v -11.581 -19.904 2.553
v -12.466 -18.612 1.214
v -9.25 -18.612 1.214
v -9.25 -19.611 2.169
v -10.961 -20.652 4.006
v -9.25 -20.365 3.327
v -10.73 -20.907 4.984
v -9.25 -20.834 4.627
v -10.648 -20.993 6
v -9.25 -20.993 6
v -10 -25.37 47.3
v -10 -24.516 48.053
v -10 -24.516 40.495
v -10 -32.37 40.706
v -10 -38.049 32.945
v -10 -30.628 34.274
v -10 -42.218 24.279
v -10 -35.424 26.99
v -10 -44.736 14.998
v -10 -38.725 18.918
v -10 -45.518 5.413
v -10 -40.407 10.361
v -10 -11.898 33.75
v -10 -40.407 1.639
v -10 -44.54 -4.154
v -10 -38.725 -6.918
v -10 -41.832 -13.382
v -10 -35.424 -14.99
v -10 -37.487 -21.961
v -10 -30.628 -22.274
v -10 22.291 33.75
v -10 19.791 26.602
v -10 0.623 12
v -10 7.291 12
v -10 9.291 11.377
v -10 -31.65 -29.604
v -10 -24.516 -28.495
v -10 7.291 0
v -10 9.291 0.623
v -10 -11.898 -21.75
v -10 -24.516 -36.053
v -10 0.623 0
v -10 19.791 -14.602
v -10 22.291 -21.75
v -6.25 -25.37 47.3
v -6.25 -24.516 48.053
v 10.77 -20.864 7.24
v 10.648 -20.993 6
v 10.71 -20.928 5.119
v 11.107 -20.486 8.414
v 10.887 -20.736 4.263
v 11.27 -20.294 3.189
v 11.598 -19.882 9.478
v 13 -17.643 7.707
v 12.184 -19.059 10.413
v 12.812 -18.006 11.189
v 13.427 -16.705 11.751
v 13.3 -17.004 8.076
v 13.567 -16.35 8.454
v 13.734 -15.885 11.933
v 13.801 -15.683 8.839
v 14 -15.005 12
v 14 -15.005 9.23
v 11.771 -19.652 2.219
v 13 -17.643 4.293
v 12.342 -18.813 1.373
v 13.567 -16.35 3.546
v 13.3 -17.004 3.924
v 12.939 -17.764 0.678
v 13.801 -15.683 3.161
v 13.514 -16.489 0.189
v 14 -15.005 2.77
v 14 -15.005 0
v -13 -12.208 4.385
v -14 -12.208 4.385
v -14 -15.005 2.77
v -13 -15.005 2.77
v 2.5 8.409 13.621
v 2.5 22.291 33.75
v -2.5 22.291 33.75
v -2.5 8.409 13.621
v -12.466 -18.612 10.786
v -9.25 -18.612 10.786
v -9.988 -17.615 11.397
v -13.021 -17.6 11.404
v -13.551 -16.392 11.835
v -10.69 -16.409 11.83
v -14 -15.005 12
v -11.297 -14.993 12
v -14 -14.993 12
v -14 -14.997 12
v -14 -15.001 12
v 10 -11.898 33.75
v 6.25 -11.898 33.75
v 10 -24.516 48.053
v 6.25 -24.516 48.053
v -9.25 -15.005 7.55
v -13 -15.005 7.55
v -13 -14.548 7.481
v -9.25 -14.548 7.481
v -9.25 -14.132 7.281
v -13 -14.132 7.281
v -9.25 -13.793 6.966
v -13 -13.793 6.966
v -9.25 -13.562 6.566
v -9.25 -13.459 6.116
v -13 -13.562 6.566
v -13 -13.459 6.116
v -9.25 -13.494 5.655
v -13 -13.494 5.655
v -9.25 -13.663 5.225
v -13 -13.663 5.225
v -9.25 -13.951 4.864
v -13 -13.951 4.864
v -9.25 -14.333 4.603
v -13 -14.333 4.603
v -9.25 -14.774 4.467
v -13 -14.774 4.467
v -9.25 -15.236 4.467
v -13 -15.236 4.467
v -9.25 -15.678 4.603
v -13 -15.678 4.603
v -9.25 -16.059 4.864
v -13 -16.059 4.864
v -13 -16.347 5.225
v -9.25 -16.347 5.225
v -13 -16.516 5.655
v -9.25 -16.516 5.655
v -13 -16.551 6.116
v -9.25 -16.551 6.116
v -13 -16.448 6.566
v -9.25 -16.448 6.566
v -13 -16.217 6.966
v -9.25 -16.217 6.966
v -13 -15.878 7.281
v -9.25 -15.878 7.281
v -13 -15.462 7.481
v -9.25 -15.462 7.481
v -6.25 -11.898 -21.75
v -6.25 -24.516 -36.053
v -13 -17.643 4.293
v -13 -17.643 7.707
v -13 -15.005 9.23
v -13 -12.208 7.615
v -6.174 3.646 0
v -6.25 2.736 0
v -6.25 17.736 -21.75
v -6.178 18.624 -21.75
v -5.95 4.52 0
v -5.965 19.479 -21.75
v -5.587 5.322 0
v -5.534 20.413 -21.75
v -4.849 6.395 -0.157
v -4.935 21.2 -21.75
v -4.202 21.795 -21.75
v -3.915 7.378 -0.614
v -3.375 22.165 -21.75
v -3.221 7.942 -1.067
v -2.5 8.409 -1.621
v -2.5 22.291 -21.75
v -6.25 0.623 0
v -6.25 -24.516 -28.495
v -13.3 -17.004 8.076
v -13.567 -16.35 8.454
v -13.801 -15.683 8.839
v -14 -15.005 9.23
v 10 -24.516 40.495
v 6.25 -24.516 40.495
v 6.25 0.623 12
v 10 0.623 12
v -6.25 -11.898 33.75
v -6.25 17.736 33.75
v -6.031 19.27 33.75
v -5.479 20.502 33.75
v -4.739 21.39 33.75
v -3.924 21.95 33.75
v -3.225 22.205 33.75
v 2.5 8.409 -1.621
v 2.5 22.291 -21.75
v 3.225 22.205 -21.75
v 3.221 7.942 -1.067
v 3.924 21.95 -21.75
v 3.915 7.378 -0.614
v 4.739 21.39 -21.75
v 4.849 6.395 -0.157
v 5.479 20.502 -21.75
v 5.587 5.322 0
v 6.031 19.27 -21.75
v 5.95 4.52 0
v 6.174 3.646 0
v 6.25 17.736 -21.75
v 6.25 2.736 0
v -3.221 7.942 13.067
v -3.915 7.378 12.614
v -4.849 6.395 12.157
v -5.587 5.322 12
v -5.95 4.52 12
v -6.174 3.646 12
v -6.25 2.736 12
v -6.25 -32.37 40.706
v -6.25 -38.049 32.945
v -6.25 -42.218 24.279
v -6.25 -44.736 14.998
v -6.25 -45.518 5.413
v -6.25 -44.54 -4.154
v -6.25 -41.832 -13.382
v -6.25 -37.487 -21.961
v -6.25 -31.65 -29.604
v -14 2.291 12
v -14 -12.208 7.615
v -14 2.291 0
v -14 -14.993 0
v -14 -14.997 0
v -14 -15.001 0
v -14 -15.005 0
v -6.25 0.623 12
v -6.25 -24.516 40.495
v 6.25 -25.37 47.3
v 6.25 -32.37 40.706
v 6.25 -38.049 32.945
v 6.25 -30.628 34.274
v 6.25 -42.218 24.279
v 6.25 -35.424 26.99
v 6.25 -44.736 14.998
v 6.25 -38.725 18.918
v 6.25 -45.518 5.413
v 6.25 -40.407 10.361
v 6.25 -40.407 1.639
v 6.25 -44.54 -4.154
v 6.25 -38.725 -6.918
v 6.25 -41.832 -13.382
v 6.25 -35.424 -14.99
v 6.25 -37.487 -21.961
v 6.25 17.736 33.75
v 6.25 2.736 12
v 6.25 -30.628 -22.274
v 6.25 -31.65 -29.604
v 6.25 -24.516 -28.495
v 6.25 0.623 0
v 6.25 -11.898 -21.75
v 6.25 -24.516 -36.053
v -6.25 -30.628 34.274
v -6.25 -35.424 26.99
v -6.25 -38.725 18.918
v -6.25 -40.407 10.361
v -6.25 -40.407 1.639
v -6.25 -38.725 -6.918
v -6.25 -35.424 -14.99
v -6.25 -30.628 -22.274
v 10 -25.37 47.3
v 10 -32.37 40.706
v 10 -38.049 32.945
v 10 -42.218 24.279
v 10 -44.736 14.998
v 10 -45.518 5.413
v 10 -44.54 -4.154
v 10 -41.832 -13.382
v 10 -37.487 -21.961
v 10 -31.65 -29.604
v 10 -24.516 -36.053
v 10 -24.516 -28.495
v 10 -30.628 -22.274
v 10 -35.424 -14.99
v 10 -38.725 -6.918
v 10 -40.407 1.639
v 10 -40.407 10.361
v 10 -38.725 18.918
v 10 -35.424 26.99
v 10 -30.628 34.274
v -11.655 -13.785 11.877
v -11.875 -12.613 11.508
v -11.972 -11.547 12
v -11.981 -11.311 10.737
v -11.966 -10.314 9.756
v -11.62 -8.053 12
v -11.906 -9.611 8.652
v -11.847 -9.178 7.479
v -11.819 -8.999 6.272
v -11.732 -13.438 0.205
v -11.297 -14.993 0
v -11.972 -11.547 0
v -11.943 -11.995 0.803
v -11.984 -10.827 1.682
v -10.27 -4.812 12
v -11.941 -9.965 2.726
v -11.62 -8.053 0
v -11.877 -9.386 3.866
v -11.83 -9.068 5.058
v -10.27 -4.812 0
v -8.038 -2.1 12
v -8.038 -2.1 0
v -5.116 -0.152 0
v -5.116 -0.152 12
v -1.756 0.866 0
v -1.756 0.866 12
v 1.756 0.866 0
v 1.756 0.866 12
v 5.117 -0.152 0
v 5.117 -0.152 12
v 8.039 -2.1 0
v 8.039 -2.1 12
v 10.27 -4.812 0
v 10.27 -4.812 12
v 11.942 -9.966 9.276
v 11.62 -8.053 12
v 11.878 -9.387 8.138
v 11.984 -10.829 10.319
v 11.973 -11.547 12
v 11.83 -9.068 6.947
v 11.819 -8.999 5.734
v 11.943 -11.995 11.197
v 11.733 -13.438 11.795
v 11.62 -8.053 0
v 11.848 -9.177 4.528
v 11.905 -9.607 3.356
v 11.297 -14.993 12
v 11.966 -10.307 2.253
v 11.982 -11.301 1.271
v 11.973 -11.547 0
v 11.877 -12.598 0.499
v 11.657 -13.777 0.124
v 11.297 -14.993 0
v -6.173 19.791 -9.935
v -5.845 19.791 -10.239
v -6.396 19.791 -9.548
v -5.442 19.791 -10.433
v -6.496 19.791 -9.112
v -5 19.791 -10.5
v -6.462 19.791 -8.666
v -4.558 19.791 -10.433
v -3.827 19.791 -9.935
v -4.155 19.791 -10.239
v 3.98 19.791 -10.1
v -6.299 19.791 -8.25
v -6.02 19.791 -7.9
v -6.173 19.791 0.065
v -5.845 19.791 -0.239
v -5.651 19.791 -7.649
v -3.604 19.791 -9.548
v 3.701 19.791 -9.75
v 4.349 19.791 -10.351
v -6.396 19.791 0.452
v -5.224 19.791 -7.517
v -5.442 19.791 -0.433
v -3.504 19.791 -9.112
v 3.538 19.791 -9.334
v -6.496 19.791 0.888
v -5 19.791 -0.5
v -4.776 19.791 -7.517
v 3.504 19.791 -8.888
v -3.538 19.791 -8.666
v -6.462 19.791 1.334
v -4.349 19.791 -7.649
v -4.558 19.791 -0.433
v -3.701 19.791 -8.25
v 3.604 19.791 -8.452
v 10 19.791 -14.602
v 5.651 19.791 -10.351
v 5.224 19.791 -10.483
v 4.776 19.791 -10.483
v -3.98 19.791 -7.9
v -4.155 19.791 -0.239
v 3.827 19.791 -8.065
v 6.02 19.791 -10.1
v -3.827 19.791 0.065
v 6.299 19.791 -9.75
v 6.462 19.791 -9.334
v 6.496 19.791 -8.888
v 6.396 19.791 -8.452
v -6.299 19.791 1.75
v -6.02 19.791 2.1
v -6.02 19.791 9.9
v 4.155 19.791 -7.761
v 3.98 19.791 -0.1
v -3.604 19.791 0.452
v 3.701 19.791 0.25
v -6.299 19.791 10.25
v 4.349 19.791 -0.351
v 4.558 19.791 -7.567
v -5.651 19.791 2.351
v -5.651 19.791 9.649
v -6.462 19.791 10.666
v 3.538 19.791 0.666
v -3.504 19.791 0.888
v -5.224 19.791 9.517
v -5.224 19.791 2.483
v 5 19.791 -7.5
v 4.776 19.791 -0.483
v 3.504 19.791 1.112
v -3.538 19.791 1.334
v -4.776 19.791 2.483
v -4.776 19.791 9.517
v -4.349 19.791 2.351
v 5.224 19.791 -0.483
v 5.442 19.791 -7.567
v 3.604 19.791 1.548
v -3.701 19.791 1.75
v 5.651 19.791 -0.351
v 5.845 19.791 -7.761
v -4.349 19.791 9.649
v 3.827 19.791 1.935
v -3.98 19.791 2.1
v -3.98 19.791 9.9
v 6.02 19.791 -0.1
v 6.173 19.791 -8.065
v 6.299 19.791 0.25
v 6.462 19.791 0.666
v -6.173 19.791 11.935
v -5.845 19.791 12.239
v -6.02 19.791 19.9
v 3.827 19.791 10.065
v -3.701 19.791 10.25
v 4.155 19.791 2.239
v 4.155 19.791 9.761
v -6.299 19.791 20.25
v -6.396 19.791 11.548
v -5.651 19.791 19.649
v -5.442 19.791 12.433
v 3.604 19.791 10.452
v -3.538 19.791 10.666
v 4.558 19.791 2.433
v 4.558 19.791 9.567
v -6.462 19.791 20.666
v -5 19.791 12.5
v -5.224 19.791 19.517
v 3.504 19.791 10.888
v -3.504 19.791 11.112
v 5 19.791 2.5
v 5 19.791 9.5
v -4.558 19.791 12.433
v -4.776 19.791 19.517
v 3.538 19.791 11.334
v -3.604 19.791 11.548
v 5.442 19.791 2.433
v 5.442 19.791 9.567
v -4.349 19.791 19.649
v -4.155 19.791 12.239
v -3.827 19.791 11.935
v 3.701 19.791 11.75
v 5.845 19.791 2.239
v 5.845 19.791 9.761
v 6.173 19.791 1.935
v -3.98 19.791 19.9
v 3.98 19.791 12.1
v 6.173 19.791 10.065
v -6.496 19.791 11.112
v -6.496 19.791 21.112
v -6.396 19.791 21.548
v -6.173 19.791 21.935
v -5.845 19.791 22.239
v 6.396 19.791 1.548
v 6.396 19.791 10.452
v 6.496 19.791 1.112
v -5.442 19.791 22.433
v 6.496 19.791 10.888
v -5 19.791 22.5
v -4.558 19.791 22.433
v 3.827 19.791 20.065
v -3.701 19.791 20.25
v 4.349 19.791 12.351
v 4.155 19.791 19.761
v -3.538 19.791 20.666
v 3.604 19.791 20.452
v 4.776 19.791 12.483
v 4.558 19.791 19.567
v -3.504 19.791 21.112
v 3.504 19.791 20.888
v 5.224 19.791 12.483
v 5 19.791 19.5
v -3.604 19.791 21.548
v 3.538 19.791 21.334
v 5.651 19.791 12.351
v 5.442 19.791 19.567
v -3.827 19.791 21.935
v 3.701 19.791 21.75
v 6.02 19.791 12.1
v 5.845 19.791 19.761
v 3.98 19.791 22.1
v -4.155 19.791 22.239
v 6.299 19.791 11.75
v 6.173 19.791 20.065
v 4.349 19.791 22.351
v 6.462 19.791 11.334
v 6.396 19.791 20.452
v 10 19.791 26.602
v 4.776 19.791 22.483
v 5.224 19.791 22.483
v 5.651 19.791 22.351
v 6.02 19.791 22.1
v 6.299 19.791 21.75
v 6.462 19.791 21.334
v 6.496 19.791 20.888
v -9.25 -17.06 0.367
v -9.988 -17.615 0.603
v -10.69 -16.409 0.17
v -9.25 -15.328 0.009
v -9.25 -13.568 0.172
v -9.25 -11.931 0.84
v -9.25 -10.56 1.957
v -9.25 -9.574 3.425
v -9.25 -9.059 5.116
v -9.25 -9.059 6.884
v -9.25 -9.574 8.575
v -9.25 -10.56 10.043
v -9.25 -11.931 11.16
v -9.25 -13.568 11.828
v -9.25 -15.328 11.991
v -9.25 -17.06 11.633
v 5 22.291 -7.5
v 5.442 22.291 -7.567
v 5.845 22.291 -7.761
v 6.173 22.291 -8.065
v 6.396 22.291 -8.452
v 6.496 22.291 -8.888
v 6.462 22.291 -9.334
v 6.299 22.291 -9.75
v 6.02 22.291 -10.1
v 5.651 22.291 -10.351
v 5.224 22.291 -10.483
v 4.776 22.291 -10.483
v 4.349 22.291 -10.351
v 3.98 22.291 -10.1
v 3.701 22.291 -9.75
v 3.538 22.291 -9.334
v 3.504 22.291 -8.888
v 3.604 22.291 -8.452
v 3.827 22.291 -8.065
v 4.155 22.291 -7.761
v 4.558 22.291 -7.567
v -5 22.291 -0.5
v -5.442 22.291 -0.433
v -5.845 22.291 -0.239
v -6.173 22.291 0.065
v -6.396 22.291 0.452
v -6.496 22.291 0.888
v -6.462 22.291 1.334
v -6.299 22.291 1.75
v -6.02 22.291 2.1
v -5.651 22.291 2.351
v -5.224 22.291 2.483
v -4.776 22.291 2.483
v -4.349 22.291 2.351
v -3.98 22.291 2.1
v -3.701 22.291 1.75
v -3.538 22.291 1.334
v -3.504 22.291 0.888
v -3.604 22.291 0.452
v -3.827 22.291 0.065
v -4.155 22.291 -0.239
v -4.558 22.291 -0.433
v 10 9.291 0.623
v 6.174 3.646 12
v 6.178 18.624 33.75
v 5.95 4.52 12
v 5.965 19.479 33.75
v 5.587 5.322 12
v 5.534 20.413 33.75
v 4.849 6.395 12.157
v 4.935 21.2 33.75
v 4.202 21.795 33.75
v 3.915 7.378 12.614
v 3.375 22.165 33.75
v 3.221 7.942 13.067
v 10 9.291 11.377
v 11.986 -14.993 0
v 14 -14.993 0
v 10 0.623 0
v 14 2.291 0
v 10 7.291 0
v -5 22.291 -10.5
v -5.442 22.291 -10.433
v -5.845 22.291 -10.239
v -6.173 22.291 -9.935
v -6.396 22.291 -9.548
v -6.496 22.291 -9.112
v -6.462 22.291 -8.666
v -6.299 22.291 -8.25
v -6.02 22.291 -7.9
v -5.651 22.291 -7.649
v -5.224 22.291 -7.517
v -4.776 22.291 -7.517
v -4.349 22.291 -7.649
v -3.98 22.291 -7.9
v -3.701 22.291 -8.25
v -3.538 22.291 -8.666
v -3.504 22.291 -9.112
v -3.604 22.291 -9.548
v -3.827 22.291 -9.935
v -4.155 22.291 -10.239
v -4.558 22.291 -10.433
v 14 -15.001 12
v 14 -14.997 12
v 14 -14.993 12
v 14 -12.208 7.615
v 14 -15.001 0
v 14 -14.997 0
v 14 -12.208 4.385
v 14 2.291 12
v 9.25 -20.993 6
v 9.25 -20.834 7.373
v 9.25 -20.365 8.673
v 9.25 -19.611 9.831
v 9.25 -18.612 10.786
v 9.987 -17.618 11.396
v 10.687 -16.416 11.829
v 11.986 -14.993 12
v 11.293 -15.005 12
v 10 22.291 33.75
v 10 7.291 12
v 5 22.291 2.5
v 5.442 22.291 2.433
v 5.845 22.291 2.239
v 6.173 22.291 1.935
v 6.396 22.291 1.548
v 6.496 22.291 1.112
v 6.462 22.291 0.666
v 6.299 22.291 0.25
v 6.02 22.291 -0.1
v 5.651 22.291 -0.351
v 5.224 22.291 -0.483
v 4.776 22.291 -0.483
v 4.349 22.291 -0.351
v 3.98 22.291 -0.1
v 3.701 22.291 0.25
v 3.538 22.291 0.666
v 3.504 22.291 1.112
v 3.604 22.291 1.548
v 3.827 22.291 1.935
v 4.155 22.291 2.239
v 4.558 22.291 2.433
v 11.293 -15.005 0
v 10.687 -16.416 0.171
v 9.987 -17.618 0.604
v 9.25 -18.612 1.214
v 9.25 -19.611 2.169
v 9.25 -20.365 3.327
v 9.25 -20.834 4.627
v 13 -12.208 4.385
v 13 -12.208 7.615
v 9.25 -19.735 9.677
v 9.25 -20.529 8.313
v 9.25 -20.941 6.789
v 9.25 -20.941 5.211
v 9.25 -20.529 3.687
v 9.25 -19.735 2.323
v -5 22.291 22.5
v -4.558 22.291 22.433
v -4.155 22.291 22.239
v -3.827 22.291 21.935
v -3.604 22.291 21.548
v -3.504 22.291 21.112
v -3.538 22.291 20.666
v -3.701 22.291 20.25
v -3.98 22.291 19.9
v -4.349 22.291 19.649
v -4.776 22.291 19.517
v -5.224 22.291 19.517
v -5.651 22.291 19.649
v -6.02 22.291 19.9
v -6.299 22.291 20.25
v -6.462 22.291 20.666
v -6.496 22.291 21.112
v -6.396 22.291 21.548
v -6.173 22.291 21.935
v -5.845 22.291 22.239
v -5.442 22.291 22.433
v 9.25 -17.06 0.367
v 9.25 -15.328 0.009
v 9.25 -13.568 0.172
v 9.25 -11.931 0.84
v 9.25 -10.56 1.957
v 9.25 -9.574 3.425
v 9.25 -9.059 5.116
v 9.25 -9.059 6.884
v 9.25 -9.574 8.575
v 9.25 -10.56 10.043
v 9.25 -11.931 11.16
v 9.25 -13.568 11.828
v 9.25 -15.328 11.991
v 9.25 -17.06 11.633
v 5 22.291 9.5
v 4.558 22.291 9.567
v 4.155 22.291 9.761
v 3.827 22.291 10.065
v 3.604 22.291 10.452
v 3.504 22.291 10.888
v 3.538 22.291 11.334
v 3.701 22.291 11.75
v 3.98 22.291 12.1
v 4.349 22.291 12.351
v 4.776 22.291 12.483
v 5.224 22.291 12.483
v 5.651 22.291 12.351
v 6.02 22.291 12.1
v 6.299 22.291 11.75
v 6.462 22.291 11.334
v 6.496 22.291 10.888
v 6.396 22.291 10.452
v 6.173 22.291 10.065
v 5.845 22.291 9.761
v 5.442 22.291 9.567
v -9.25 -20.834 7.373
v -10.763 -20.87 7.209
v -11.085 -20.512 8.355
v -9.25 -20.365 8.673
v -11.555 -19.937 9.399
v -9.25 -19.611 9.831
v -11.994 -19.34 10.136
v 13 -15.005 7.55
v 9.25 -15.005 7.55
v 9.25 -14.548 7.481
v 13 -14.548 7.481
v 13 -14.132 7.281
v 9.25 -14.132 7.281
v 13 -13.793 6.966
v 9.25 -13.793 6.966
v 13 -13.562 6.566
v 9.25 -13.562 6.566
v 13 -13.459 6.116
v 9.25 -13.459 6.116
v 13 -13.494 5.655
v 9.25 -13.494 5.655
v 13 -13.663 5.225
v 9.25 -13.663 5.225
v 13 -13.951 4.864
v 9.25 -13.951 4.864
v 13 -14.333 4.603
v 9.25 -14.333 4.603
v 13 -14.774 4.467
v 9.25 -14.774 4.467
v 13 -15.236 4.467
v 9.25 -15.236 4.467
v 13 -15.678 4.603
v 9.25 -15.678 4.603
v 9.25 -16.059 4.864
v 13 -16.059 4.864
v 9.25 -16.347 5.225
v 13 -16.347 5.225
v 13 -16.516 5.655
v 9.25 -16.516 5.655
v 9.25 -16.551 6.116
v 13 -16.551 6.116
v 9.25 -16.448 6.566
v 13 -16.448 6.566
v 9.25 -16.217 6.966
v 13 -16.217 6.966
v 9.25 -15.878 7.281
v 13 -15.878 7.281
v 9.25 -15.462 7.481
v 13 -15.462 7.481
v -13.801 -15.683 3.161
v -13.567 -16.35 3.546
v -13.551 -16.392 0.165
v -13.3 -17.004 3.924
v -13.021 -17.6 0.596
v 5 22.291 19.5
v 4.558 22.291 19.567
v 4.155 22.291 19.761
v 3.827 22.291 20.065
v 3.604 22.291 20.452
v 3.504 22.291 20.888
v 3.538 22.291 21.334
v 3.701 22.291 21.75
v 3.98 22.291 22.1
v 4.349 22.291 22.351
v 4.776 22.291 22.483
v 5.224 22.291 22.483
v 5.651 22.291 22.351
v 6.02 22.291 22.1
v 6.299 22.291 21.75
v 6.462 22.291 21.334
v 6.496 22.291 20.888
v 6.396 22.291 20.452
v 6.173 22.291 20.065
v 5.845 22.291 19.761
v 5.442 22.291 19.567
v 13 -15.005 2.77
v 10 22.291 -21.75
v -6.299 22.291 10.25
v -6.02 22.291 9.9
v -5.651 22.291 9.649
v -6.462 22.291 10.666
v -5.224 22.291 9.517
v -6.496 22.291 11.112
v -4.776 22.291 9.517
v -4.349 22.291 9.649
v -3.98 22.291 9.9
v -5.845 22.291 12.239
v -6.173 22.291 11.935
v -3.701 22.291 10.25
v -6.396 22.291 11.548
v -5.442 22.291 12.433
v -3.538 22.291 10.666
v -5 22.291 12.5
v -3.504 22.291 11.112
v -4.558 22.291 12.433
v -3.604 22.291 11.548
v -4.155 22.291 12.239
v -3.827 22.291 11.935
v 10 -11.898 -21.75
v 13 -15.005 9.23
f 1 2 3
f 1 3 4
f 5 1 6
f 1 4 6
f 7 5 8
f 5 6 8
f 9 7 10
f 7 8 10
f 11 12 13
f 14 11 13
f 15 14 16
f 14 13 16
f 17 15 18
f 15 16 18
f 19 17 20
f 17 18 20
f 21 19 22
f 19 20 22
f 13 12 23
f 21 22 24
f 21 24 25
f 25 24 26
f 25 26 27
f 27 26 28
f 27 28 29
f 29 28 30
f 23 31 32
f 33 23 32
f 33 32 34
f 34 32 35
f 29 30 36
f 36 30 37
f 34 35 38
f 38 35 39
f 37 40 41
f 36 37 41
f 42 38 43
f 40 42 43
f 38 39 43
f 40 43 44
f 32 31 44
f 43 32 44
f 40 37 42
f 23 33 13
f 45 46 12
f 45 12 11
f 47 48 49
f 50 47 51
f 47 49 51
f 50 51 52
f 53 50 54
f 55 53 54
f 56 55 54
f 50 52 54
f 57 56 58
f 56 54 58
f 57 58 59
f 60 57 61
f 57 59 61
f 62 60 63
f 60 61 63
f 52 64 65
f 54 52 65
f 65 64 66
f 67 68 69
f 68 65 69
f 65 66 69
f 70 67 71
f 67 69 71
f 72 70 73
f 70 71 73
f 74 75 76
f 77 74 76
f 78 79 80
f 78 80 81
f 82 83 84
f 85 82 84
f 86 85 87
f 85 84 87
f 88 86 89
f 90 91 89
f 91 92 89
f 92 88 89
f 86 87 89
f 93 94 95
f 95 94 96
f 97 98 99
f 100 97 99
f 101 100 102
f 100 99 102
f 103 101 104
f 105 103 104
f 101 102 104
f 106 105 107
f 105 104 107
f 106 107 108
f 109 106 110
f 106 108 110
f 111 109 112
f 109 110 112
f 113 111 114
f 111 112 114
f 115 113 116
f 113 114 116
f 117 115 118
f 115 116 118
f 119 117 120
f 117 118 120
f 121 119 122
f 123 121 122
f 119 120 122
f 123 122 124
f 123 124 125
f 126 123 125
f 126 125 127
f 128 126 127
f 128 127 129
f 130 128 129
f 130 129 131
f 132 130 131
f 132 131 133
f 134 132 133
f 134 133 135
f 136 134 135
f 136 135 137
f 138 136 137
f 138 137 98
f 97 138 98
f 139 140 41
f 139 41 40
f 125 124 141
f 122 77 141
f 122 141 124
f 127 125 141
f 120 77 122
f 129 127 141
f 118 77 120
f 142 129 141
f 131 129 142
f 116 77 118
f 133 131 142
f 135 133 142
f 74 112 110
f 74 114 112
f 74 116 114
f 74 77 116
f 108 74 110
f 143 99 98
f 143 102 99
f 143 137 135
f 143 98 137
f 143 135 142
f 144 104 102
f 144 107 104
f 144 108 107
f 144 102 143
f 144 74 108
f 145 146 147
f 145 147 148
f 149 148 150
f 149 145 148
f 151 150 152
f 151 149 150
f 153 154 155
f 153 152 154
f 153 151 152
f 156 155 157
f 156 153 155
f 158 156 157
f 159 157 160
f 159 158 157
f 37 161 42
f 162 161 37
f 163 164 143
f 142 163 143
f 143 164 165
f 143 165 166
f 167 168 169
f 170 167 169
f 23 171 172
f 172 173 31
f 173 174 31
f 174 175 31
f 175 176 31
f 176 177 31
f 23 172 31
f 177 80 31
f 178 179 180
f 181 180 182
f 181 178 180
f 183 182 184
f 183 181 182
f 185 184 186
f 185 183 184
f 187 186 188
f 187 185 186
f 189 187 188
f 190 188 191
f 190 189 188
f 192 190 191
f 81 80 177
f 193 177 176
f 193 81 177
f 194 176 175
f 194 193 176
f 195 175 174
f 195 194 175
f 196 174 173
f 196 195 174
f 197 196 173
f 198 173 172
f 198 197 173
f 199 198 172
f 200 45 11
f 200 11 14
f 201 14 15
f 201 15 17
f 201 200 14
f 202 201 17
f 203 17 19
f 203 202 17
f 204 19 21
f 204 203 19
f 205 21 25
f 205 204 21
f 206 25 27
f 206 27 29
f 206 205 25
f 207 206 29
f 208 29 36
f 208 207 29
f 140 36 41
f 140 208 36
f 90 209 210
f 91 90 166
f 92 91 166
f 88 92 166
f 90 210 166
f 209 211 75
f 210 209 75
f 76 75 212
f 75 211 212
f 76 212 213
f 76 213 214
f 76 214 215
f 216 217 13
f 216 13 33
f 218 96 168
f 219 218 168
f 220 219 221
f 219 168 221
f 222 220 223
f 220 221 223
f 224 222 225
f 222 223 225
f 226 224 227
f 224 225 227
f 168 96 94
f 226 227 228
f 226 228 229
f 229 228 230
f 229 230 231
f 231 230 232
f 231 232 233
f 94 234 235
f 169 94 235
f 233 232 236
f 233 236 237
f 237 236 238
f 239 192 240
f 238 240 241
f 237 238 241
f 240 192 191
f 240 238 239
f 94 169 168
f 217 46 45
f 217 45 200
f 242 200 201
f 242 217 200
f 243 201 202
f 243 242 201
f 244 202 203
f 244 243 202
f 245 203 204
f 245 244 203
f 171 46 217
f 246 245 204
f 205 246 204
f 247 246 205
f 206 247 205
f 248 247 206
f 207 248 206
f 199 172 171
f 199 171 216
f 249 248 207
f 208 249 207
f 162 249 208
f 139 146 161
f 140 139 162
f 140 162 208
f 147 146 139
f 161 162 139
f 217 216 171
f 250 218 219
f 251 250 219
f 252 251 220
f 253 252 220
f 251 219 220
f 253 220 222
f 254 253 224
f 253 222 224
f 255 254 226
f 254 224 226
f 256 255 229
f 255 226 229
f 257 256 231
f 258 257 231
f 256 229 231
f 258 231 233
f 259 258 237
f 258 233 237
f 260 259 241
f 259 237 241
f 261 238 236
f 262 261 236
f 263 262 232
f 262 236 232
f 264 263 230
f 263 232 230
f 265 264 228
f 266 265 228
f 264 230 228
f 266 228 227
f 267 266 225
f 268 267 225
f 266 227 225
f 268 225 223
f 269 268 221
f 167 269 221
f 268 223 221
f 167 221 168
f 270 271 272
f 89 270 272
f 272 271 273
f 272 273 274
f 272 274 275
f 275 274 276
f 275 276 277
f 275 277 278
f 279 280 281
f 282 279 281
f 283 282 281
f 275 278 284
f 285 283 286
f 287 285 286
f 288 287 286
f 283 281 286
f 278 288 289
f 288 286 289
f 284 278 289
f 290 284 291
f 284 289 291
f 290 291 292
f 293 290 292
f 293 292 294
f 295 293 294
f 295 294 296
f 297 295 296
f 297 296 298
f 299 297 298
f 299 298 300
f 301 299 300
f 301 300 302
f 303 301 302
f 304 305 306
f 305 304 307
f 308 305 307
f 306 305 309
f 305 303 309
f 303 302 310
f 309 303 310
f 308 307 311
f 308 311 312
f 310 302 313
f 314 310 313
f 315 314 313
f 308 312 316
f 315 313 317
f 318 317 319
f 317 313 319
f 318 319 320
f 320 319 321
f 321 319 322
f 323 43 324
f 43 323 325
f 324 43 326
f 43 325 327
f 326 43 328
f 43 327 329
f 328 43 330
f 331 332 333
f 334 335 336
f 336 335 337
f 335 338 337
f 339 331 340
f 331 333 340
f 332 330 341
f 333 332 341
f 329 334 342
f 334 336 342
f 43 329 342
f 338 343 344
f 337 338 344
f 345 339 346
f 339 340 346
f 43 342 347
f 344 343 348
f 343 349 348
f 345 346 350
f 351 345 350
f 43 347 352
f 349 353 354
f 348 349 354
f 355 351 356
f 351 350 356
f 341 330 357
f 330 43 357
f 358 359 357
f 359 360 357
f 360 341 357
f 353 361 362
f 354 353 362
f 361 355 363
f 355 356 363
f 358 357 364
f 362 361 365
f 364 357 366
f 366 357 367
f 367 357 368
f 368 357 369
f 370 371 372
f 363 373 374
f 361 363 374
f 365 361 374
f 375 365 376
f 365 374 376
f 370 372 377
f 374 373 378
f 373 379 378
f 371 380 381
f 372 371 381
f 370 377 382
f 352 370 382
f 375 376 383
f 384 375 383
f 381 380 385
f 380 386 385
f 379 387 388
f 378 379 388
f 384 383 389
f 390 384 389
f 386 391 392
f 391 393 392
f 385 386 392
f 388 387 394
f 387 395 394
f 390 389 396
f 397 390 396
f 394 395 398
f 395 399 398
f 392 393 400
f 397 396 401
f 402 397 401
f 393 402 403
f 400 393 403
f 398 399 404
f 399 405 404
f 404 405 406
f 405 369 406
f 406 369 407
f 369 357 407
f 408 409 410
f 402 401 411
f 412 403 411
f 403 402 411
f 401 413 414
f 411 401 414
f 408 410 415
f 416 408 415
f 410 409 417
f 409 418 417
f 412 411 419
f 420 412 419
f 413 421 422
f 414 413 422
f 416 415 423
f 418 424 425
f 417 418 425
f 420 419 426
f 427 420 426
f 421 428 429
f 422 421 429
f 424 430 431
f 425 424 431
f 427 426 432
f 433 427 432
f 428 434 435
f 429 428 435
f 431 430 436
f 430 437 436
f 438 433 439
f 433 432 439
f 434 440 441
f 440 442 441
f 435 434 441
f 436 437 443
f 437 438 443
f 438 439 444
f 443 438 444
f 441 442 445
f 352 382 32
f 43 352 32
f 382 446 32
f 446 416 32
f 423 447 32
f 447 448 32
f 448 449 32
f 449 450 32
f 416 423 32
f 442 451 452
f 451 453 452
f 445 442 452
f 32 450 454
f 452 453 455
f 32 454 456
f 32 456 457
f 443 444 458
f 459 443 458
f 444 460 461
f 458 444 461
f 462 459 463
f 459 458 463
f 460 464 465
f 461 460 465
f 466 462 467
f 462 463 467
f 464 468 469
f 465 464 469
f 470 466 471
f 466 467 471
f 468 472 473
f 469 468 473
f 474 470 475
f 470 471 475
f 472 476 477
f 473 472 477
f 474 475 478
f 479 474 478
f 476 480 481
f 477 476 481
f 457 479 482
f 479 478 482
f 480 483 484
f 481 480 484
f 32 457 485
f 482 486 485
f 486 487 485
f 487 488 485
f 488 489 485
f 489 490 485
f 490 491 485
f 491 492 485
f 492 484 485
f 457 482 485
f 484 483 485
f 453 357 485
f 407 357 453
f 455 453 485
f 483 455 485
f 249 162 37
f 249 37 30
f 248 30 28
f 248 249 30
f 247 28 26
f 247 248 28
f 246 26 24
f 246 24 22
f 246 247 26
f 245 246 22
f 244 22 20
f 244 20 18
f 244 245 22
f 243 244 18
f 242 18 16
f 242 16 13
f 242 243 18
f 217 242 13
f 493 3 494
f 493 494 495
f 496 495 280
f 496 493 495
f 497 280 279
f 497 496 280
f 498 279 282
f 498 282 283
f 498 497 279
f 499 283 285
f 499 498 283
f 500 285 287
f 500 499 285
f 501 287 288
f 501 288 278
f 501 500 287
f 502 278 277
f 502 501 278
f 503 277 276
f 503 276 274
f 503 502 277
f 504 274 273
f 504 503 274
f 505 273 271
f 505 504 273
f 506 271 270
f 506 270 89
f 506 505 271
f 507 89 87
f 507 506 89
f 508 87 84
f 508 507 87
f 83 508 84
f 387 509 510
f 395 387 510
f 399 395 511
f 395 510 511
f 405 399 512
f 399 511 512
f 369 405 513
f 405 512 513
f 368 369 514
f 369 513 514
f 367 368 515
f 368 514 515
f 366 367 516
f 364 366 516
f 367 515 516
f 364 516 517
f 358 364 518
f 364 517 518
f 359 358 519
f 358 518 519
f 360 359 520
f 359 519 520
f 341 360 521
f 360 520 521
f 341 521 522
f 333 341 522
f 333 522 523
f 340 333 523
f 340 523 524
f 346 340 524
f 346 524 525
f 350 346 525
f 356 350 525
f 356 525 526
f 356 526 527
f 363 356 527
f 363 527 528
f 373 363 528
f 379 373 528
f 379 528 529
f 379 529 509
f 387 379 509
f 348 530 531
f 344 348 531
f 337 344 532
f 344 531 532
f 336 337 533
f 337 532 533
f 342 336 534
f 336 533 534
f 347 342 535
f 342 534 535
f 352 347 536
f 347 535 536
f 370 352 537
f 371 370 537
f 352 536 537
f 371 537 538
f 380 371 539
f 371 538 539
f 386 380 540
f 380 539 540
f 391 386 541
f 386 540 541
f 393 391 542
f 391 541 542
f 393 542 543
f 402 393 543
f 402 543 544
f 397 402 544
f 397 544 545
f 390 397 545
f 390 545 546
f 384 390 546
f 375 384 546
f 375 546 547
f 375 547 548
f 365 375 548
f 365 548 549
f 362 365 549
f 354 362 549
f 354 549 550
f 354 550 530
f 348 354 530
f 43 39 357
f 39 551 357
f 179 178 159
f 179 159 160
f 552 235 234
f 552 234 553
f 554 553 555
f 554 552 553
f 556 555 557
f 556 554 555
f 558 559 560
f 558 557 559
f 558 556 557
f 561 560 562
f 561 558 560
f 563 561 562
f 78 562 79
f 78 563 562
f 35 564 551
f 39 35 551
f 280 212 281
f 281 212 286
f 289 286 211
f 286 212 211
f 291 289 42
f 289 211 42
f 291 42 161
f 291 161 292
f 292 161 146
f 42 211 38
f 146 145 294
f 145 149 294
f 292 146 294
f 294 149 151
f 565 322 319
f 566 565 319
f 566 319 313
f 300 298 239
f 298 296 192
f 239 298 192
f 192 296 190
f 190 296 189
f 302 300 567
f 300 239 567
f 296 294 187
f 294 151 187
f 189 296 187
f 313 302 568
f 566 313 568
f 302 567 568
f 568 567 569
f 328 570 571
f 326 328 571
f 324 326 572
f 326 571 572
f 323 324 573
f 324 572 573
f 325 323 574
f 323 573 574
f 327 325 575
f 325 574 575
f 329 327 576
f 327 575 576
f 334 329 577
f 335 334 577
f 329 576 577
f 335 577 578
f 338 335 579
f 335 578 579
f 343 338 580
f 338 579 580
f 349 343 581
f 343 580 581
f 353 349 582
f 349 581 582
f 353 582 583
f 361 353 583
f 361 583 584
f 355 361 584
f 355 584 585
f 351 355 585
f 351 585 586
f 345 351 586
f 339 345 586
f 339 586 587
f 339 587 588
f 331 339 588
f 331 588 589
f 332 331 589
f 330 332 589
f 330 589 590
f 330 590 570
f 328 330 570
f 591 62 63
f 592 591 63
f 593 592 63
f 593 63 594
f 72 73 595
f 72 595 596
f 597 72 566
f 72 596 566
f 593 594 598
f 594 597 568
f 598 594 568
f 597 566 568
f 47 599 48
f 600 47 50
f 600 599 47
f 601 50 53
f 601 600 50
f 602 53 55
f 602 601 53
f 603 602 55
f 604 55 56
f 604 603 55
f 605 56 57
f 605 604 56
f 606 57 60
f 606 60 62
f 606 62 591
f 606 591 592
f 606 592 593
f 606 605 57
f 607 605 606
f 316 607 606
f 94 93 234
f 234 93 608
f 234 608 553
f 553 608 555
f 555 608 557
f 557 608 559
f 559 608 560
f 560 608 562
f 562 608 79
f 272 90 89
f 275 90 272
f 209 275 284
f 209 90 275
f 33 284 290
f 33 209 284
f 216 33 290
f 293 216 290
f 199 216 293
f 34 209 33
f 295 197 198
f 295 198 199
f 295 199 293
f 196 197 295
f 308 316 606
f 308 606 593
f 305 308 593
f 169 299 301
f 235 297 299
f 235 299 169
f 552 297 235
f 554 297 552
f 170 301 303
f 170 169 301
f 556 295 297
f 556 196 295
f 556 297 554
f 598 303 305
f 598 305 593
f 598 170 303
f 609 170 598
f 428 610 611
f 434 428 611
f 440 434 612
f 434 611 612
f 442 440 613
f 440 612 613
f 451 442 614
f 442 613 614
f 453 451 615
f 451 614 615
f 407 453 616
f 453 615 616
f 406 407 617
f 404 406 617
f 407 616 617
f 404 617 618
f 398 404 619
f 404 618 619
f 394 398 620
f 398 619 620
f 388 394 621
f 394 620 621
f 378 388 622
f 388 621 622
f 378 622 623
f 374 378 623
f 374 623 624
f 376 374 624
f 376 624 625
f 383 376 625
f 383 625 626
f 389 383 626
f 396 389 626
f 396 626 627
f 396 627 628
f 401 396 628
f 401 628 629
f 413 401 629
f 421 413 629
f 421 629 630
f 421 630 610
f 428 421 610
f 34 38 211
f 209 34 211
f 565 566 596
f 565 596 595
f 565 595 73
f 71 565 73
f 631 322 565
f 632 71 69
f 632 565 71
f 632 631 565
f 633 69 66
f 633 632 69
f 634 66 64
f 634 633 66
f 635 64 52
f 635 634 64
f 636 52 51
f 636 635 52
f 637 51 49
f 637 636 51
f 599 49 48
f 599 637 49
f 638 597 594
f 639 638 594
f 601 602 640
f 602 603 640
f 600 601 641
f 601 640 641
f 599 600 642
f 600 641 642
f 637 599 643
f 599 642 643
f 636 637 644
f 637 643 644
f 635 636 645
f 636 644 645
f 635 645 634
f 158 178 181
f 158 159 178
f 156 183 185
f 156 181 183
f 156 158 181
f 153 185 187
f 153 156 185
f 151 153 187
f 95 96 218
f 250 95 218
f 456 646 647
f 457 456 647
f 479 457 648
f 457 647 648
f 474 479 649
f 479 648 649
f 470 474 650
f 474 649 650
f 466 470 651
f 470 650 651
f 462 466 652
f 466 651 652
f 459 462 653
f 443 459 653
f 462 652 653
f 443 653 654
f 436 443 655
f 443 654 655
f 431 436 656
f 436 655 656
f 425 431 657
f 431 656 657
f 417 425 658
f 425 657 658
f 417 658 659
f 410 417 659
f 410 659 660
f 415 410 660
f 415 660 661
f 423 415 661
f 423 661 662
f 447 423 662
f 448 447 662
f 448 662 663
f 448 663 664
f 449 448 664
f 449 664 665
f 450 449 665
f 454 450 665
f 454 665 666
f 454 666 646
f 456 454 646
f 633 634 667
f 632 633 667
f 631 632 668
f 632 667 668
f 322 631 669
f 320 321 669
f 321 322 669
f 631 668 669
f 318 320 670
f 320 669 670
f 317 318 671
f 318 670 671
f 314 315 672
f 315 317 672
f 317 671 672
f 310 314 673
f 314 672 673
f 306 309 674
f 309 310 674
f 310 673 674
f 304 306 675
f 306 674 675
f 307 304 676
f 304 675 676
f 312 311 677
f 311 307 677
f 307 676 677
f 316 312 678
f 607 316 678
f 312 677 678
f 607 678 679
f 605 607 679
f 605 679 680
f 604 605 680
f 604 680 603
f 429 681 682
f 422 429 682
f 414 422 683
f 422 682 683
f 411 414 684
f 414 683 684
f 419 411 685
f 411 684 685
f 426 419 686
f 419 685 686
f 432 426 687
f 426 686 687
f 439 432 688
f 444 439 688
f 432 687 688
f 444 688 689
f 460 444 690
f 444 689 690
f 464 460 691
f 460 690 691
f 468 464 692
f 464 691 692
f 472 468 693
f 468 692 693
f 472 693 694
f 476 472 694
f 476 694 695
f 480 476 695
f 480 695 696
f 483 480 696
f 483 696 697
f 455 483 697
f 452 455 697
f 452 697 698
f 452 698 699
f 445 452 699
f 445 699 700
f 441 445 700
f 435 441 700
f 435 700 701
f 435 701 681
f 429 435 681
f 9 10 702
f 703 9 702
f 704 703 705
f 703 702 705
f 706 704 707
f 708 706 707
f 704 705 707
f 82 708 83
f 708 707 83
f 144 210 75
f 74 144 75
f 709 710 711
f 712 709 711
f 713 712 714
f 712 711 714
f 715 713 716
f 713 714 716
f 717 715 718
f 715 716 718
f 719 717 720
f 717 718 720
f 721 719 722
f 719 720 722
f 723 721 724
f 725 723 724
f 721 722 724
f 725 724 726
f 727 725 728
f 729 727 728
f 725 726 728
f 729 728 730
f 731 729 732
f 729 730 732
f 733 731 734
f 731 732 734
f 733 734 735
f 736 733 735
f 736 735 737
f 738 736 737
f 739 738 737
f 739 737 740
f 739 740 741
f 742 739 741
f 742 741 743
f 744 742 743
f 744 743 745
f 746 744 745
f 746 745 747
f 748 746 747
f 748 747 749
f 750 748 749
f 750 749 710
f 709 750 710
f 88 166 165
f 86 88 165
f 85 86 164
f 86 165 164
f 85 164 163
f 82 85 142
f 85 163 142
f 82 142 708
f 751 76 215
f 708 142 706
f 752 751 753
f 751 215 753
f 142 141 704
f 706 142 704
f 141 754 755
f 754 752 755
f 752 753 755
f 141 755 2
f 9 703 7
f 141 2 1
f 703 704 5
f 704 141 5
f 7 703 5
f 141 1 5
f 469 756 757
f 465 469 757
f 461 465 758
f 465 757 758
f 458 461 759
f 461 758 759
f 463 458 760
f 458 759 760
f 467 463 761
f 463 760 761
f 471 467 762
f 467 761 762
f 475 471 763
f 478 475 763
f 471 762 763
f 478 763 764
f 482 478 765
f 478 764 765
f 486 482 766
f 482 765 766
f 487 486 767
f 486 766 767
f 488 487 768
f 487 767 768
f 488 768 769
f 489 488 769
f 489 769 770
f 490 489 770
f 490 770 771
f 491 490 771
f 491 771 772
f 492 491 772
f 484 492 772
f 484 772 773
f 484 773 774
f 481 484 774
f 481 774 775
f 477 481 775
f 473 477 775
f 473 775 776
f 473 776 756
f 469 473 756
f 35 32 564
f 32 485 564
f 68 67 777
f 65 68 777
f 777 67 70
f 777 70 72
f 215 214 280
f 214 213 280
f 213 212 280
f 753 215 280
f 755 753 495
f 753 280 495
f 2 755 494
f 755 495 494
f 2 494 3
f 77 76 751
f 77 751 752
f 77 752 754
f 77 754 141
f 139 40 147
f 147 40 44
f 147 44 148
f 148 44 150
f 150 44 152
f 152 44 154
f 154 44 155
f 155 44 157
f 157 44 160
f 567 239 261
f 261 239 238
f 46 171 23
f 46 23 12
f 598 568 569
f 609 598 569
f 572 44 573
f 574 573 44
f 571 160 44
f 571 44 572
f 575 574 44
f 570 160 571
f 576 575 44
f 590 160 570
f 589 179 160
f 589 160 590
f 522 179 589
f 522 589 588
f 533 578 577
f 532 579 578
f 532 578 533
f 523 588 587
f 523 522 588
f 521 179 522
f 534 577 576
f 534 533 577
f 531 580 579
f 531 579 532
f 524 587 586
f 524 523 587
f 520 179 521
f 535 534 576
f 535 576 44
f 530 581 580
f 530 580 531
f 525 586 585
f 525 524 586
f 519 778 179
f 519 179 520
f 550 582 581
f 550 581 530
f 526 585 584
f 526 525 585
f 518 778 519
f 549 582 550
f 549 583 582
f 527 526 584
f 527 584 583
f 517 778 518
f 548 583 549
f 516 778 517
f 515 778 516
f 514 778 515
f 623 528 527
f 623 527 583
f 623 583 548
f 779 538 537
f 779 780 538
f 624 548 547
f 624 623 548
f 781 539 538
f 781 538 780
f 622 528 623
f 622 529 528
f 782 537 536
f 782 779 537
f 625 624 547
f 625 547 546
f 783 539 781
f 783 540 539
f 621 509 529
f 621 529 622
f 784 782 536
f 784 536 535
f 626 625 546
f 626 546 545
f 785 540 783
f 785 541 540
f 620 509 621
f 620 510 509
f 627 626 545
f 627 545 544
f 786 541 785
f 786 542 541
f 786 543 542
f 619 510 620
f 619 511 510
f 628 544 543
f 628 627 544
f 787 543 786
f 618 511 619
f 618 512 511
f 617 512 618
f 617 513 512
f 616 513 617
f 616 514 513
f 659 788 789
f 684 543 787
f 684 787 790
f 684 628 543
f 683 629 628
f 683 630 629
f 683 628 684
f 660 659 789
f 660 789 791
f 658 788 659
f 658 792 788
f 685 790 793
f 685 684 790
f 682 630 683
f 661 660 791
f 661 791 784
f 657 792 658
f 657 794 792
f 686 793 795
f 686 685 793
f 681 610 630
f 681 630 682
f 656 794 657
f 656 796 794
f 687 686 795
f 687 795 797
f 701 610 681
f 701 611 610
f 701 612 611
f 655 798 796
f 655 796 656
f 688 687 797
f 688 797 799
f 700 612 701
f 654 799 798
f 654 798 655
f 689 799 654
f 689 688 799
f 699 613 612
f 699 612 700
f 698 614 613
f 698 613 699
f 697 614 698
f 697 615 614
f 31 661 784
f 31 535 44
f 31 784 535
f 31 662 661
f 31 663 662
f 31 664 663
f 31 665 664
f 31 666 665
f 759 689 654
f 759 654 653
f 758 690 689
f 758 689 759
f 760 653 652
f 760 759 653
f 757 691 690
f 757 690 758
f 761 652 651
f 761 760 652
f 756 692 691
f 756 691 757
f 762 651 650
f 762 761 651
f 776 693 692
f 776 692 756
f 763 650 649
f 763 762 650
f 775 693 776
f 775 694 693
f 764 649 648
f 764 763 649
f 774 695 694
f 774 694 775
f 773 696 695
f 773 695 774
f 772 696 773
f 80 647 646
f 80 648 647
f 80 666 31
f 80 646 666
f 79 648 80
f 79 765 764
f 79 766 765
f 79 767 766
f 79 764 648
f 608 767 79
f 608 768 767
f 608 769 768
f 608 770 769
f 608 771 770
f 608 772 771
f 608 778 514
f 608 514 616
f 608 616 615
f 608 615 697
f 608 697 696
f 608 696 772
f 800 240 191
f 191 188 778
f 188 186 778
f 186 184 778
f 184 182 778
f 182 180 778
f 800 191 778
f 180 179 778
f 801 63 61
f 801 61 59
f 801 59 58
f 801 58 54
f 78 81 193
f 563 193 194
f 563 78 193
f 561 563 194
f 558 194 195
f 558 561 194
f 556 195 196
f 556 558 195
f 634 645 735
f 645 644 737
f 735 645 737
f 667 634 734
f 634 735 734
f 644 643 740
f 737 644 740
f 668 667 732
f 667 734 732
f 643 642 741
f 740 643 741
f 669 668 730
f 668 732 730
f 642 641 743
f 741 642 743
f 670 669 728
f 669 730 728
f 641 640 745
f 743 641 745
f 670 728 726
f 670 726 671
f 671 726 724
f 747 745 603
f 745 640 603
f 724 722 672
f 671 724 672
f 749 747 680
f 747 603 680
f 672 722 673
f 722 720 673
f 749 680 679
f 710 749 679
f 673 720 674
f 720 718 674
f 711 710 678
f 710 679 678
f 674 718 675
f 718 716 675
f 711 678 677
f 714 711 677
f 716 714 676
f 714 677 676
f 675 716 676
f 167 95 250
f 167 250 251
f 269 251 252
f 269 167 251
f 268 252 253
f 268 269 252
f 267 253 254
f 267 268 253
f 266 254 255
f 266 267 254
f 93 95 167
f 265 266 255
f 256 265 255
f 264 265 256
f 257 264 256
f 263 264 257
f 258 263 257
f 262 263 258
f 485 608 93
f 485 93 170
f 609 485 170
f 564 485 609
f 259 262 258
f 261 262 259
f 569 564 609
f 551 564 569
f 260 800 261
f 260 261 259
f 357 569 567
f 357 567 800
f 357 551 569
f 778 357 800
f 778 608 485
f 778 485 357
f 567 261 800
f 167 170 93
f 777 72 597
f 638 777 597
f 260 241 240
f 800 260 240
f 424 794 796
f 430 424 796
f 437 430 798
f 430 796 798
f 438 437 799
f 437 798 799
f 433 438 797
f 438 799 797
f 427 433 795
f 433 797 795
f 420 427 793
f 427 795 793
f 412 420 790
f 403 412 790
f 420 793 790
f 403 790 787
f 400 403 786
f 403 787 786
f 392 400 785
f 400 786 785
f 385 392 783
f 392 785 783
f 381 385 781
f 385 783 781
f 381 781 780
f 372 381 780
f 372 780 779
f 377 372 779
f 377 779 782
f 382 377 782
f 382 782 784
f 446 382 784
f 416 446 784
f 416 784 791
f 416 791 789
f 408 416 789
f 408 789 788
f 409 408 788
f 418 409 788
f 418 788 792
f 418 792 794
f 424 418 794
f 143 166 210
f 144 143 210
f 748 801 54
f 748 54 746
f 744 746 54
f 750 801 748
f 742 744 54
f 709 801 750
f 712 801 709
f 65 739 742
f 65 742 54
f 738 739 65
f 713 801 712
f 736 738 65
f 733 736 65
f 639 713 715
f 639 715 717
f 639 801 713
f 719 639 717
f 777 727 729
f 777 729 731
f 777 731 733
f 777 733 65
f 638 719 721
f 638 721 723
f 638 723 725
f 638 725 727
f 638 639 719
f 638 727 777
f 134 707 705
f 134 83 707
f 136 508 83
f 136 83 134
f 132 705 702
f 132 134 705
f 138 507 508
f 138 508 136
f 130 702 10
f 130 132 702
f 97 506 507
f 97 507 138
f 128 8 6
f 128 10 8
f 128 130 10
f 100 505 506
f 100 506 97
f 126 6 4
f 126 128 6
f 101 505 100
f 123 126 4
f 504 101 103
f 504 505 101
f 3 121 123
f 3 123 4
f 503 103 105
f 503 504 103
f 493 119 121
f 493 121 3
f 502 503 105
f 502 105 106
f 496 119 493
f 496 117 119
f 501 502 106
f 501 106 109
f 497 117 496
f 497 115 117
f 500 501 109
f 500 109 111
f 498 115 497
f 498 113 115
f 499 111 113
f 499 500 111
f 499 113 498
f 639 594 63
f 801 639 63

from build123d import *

# Parameters (mm, degrees)
EXTRUDE_1_DEPTH      = 12
EXTRUDE_2_REACH      = 35.545
EXTRUDE_2_END_RADIUS = 11.985372339
SKETCH_2_R           = 6
MIRROR_START         = 9.249795062
MIRROR_1_DEPTH       = 2.735782315
MIRROR_1_2_DEPTH     = 0.000409876
CUT_EXTRUDE_1_DEPTH  = 34.545141776
CUT_EXTRUDE_2_DEPTH  = 1
CUT_EXTRUDE_3_DEPTH  = 1
MIRROR_START_2       = 9.250204938
MIRROR_3_DEPTH       = 5.749795062
SKETCH_6_R           = 1.55
CUT_EXTRUDE_4_DEPTH  = 37.245193425
SKETCH_12_W          = 20
SKETCH_12_H          = 12
EXTRUDE_4_DEPTH      = 5
EXTRUDE_5_DEPTH      = 10
EXTRUDE_6_DEPTH      = 12
EXTRUDE_7_DEPTH      = 3.75
EXTRUDE_8_DEPTH      = 3.75
FILLET_1_R           = 3.75
SKETCH_21_R          = 1.5
CUT_EXTRUDE_5_DEPTH  = 3


with BuildPart() as part:
    # 스케치1 → 보스-돌출1 (new body)
    with BuildSketch(Plane.XY):
        with BuildLine():
            Line((14.000204938, 2.291069809), (-13.999795062, 2.291069809))
            Line((-13.999795062, 2.291069809), (-13.999795062, -6.939240191))
            Line((-13.999795062, -6.939240191), (-13.999795062, -15.005030191))
            ThreePointArc((-13.999795062, -15.005030191), (-12.699794, -18.209549332), (-10.647895062, -20.993190191))
            Line((-10.647895062, -20.993190191), (-9.249795062, -20.993190191))
            Line((-9.249795062, -20.993190191), (-9.249795062, -18.61185417))
            ThreePointArc((-9.249795062, -18.61185417), (-10.428409882, -16.897436148), (-11.292795062, -15.005030191))
            ThreePointArc((-11.292795062, -15.005030191), (0.000204938, 0.99497801), (11.293204938, -15.005030191))
            ThreePointArc((11.293204938, -15.005030191), (10.428819757, -16.897436148), (9.250204938, -18.61185417))
            Line((9.250204938, -18.61185417), (9.250204938, -20.993190191))
            Line((9.250204938, -20.993190191), (10.648304938, -20.993190191))
            ThreePointArc((10.648304938, -20.993190191), (12.700203875, -18.209549332), (14.000204938, -15.005030191))
            Line((14.000204938, -15.005030191), (14.000204938, -6.939240191))
            Line((14.000204938, -6.939240191), (14.000204938, 2.291069809))
        make_face()
    extrude(amount=EXTRUDE_1_DEPTH)

    # 보스-돌출2: up to this cylinder (the profile starts inside it)
    extrude_2_end = Plane(origin=(0.000204938, -10.990394329, 6), z_dir=(0, 0, -1)) * Cylinder(EXTRUDE_2_END_RADIUS, 96.060744678, mode=Mode.PRIVATE)
    # 스케치2 → 보스-돌출2 (add, up to the surface)
    with BuildSketch(Plane(origin=(-9.249795062, 0, 0), x_dir=(0, 0, -1), z_dir=(1, 0, 0)), mode=Mode.PRIVATE) as extrude_2_sk1:
        with Locations((-6, -14.993190191)):
            Circle(SKETCH_2_R)
    extrude_2_tool1 = extrude(extrude_2_sk1.sketch, amount=-EXTRUDE_2_REACH, mode=Mode.PRIVATE) & extrude_2_end
    add(extrude_2_tool1.solids().sort_by_distance((-9.249795, -14.99319, 6))[0])

    # 대칭 복사1: read off the stored shape, not the designer's step
    # 대칭 복사1 outline → 대칭 복사1 (add)
    with BuildSketch(Plane.YZ.offset(MIRROR_START)):
        with BuildLine():
            ThreePointArc((-18.61185417, 1.214054847), (-8.993190191, 6), (-18.61185417, 10.785945153))
            Line((-18.61185417, 10.785945153), (-18.61185417, 1.214054847))
        make_face()
    extrude(amount=MIRROR_1_DEPTH)

    # Mirror 1 2 outline → Mirror 1 2 (add)
    with BuildSketch(Plane.YZ.offset(MIRROR_START)):
        with BuildLine():
            Line((-18.61185417, 1.214054847), (-18.61185417, 10.785945153))
            ThreePointArc((-18.61185417, 10.785945153), (-20.993190191, 6), (-18.61185417, 1.214054847))
        make_face()
    extrude(amount=MIRROR_1_2_DEPTH)

    # 스케치3 → 컷-돌출1 (cut, through all)
    with BuildSketch(Plane(origin=(-9.249795062, 0, 0), x_dir=(0, 0, -1), z_dir=(1, 0, 0))):
        with BuildLine():
            Line((-6, -20.993190191), (0, -20.993190191))
            Line((0, -20.993190191), (0, -18.61185417))
            Line((0, -18.61185417), (-1.214054847, -18.61185417))
            ThreePointArc((-1.214054847, -18.61185417), (-3.327172272, -20.364967545), (-6, -20.993190191))
        make_face()
        with BuildLine():
            Line((-12, -20.993190191), (-6, -20.993190191))
            ThreePointArc((-6, -20.993190191), (-8.672827728, -20.364967545), (-10.785945153, -18.61185417))
            Line((-10.785945153, -18.61185417), (-12, -18.61185417))
            Line((-12, -18.61185417), (-12, -20.993190191))
        make_face()
        with BuildLine():
            Line((-12, -18.61185417), (-10.785945153, -18.61185417))
            ThreePointArc((-10.785945153, -18.61185417), (-11.688394805, -16.901635773), (-12, -14.993190191))
            Line((-12, -14.993190191), (-12, -18.61185417))
        make_face()
        with BuildLine():
            Line((-1.214054847, -18.61185417), (0, -18.61185417))
            Line((0, -18.61185417), (0, -14.993190191))
            ThreePointArc((0, -14.993190191), (-0.311605195, -16.901635773), (-1.214054847, -18.61185417))
        make_face()
    extrude(amount=-CUT_EXTRUDE_1_DEPTH, mode=Mode.SUBTRACT)

    # 스케치4 → 컷-돌출2 (cut)
    with BuildSketch(Plane.ZY.offset(13.999795062)):
        Polygon((9.23, -15.005030191), (7.615, -12.207768137), (4.385, -12.207768137), (2.77, -15.005030191), (4.385, -17.802292245), (7.615, -17.802292245), align=None)
    extrude(amount=-CUT_EXTRUDE_2_DEPTH, mode=Mode.SUBTRACT)

    # 스케치5 → 컷-돌출3 (cut)
    with BuildSketch(Plane(origin=(14.000204938, 0, 0), x_dir=(0, 0, -1), z_dir=(1, 0, 0))):
        Polygon((-2.77, -15.005030191), (-4.385, -12.207768137), (-7.615, -12.207768137), (-9.23, -15.005030191), (-7.615, -17.802292245), (-4.385, -17.802292245), align=None)
    extrude(amount=-CUT_EXTRUDE_3_DEPTH, mode=Mode.SUBTRACT)

    # 대칭 복사3: read off the stored shape, not the designer's step
    # 대칭 복사3 outline → 대칭 복사3 (cut)
    with BuildSketch(Plane.YZ.offset(MIRROR_START_2)):
        with BuildLine():
            ThreePointArc((-20.993190191, 6), (-19.235830878, 10.242640687), (-14.993190191, 12))
            Line((-14.993190191, 12), (-20.993190191, 12))
            Line((-20.993190191, 12), (-20.993190191, 6))
        make_face()
        with BuildLine():
            Line((-20.993190191, 0), (-14.993190191, 0))
            ThreePointArc((-14.993190191, 0), (-19.235830878, 1.757359313), (-20.993190191, 6))
            Line((-20.993190191, 6), (-20.993190191, 0))
        make_face()
    extrude(amount=MIRROR_3_DEPTH, mode=Mode.SUBTRACT)

    # 스케치6 → 컷-돌출4 (cut, through all)
    with BuildSketch(Plane.ZY.offset(12.999795062)):
        with Locations((6, -15.005030191)):
            Circle(SKETCH_6_R)
    extrude(amount=-CUT_EXTRUDE_4_DEPTH, mode=Mode.SUBTRACT)

    # 스케치12 → 보스-돌출4 (add)
    with BuildSketch(Plane(origin=(0, 2.291069809, 0), x_dir=(1, 0, 0), z_dir=(0, 1, 0))):
        with Locations((0, -6)):
            Rectangle(SKETCH_12_W, SKETCH_12_H)
    extrude(amount=EXTRUDE_4_DEPTH)

    # 스케치14 → 보스-돌출5 (add, symmetric)
    with BuildSketch(Plane(origin=(0, 0, 0), x_dir=(0, 0, -1), z_dir=(1, 0, 0))):
        Polygon((-12, 7.291069809), (0, 7.291069809), (21.75, 22.291069809), (-33.75, 22.291069809), align=None)
        Polygon((-11.377217009, 9.291069809), (-0.622782991, 9.291069809), (14.602217009, 19.791069809), (-26.602217009, 19.791069809), align=None, mode=Mode.SUBTRACT)
    extrude(amount=EXTRUDE_5_DEPTH, both=True)

    # 스케치15 → 보스-돌출6 (add)
    with BuildSketch(Plane.XY.offset(12)):
        Polygon((-10, 7.291069809), (-13.999795062, 2.291069809), (-10, 2.291069809), align=None)
        Polygon((10, 2.291069809), (14.000204938, 2.291069809), (10, 7.291069809), align=None)
    extrude(amount=-EXTRUDE_6_DEPTH)

    # 스케치19 → 보스-돌출7 (add)
    with BuildSketch(Plane(origin=(6.25, 0, 0), x_dir=(0, 0, -1), z_dir=(1, 0, 0))):
        with BuildLine():
            Line((-12, 0.623337928), (-12, 7.291069809))
            Line((-12, 7.291069809), (-48.053184311, -24.516461273))
            Line((-48.053184311, -24.516461273), (-47.300067067, -25.370104227))
            ThreePointArc((-47.300067067, -25.370104227), (-5.412725687, -45.518439989), (36.053184311, -24.516461273))
            Line((36.053184311, -24.516461273), (0, 7.291069809))
            Line((0, 7.291069809), (0, 0.623337928))
            Line((0, 0.623337928), (28.495446937, -24.516461273))
            ThreePointArc((28.495446937, -24.516461273), (-6, -40.618984902), (-40.495446937, -24.516461273))
            Line((-40.495446937, -24.516461273), (-12, 0.623337928))
        make_face()
    extrude_7 = extrude(amount=EXTRUDE_7_DEPTH)

    # 대칭 복사4: 보스-돌출7 across plane
    add(extrude_7.mirror(Plane(origin=(0, 0, 0), x_dir=(0, 0, 1), z_dir=(1, 0, 0))))

    # 스케치20 → 보스-돌출8 (add)
    with BuildSketch(Plane(origin=(10, 0, 0), x_dir=(0, 0, -1), z_dir=(1, 0, 0))):
        Polygon((-12, 7.291069809), (-33.75, 22.291069809), (-33.75, -11.897631945), align=None)
        Polygon((21.75, 22.291069809), (21.75, -11.897631945), (0, 7.291069809), align=None)
    extrude_8 = extrude(amount=-EXTRUDE_8_DEPTH)

    # 대칭 복사5: 보스-돌출8 across plane
    add(extrude_8.mirror(Plane(origin=(0, 0, 0), x_dir=(0, 0, 1), z_dir=(1, 0, 0))))

    # 필렛1
    # the kernel refuses this fillet: 3.75 mm, written as the material it adds along each edge
    with BuildSketch(Plane(origin=(-6.25, 7.291069809, 0), x_dir=(0, -1, 0), z_dir=(1, 0, 0))) as fillet_1_piece_1_section:
        with BuildLine():
            CenterArc((FILLET_1_R * 0.525097583021, FILLET_1_R), FILLET_1_R, 214.592288688, 55.407711312)
            Line((-FILLET_1_R * 0.298115202894, FILLET_1_R * 0.432267044196), (0, 0))
            Line((0, 0), (FILLET_1_R * 0.525097583021, 0))
        make_face()
    fillet_1_piece_1 = extrude(amount=17.422789841, mode=Mode.PRIVATE)
    fillet_1_piece_1 = split(fillet_1_piece_1, bisect_by=Plane(origin=(10, 7.291069809, 0), z_dir=(-1, 0, 0)), keep=Keep.TOP, mode=Mode.PRIVATE)
    add(fillet_1_piece_1)
    with BuildSketch(Plane(origin=(11.172789841, 7.291069809, 12), x_dir=(0, -1, 0), z_dir=(-1, 0, 0))) as fillet_1_piece_2_section:
        with BuildLine():
            CenterArc((FILLET_1_R * 0.525097583021, FILLET_1_R), FILLET_1_R, 214.592288688, 55.407711312)
            Line((-FILLET_1_R * 0.298115202894, FILLET_1_R * 0.432267044196), (0, 0))
            Line((0, 0), (FILLET_1_R * 0.525097583021, 0))
        make_face()
    fillet_1_piece_2 = extrude(amount=17.422789841, mode=Mode.PRIVATE)
    fillet_1_piece_2 = split(fillet_1_piece_2, bisect_by=Plane(origin=(10, 7.291069809, 12), z_dir=(-1, 0, 0)), keep=Keep.TOP, mode=Mode.PRIVATE)
    add(fillet_1_piece_2)
    with BuildSketch(Plane(origin=(6.25, 1.968573348, 4.282380132), x_dir=(-1, 0, 0), z_dir=(0, 0.5677329558036596, 0.8232127859153063))) as fillet_1_piece_3_section:
        with BuildLine():
            CenterArc((FILLET_1_R, FILLET_1_R), FILLET_1_R, 180, 90)
            Line((0, FILLET_1_R), (0, 0))
            Line((0, 0), (FILLET_1_R, 0))
        make_face()
    fillet_1_piece_3 = extrude(amount=45.170872431, mode=Mode.PRIVATE)
    fillet_1_piece_3 = split(fillet_1_piece_3, bisect_by=Plane(origin=(6.25, 1.968573348, 12), z_dir=(0, 0, 1)), keep=Keep.TOP, mode=Mode.PRIVATE)
    fillet_1_piece_3 = split(fillet_1_piece_3, bisect_by=Plane(origin=(6.25, 1.968573348, 33.75), z_dir=(0, 0, -1)), keep=Keep.TOP, mode=Mode.PRIVATE)
    add(fillet_1_piece_3)
    with BuildSketch(Plane(origin=(6.25, 1.968573348, 7.717619868), x_dir=(0, -0.8232127859153062, -0.5677329558036597), z_dir=(0, 0.5677329558036597, -0.8232127859153062))) as fillet_1_piece_4_section:
        with BuildLine():
            CenterArc((FILLET_1_R, FILLET_1_R), FILLET_1_R, 180, 90)
            Line((0, FILLET_1_R), (0, 0))
            Line((0, 0), (FILLET_1_R, 0))
        make_face()
    fillet_1_piece_4 = extrude(amount=45.170872431, mode=Mode.PRIVATE)
    fillet_1_piece_4 = split(fillet_1_piece_4, bisect_by=Plane(origin=(6.25, 1.968573348, 0), z_dir=(0, 0, -1)), keep=Keep.TOP, mode=Mode.PRIVATE)
    fillet_1_piece_4 = split(fillet_1_piece_4, bisect_by=Plane(origin=(6.25, 1.968573348, -21.75), z_dir=(0, 0, 1)), keep=Keep.TOP, mode=Mode.PRIVATE)
    add(fillet_1_piece_4)
    with BuildSketch(Plane(origin=(-6.25, 1.968573348, 4.282380132), x_dir=(0, -0.8232127859153063, 0.5677329558036595), z_dir=(0, 0.5677329558036596, 0.8232127859153063))) as fillet_1_piece_5_section:
        with BuildLine():
            CenterArc((FILLET_1_R, FILLET_1_R), FILLET_1_R, 180, 90)
            Line((0, FILLET_1_R), (0, 0))
            Line((0, 0), (FILLET_1_R, 0))
        make_face()
    fillet_1_piece_5 = extrude(amount=45.170872431, mode=Mode.PRIVATE)
    fillet_1_piece_5 = split(fillet_1_piece_5, bisect_by=Plane(origin=(-6.25, 1.968573348, 12), z_dir=(0, 0, 1)), keep=Keep.TOP, mode=Mode.PRIVATE)
    fillet_1_piece_5 = split(fillet_1_piece_5, bisect_by=Plane(origin=(-6.25, 1.968573348, 33.75), z_dir=(0, 0, -1)), keep=Keep.TOP, mode=Mode.PRIVATE)
    add(fillet_1_piece_5)
    with BuildSketch(Plane(origin=(-6.25, 1.968573348, 7.717619868), x_dir=(0, -0.8232127859153062, -0.5677329558036597), z_dir=(0, 0.5677329558036597, -0.8232127859153062))) as fillet_1_piece_6_section:
        with BuildLine():
            CenterArc((FILLET_1_R, -FILLET_1_R), FILLET_1_R, 90, 90)
            Line((0, -FILLET_1_R), (0, 0))
            Line((0, 0), (FILLET_1_R, 0))
        make_face()
    fillet_1_piece_6 = extrude(amount=45.170872431, mode=Mode.PRIVATE)
    fillet_1_piece_6 = split(fillet_1_piece_6, bisect_by=Plane(origin=(-6.25, 1.968573348, 0), z_dir=(0, 0, -1)), keep=Keep.TOP, mode=Mode.PRIVATE)
    fillet_1_piece_6 = split(fillet_1_piece_6, bisect_by=Plane(origin=(-6.25, 1.968573348, -21.75), z_dir=(0, 0, 1)), keep=Keep.TOP, mode=Mode.PRIVATE)
    add(fillet_1_piece_6)

    # 스케치21 → 컷-돌출5 (cut)
    with BuildSketch(Plane(origin=(0, 22.291069809, 0), x_dir=(1, 0, 0), z_dir=(0, 1, 0))):
        with Locations(Location((5, 9, 0), (0, 0, 270))):
            Circle(SKETCH_21_R)
        with Locations(Location((5, -1, 0), (0, 0, 270))):
            Circle(SKETCH_21_R)
        with Locations(Location((-5, 9, 0), (0, 0, 90))):
            Circle(SKETCH_21_R)
        with Locations(Location((-5, -1, 0), (0, 0, 90))):
            Circle(SKETCH_21_R)
        with Locations(Location((5, -11, 0), (0, 0, 90))):
            Circle(SKETCH_21_R)
        with Locations(Location((5, -21, 0), (0, 0, 90))):
            Circle(SKETCH_21_R)
        with Locations(Location((-5, -21, 0), (0, 0, 270))):
            Circle(SKETCH_21_R)
        with Locations(Location((-5, -11, 0), (0, 0, 270))):
            Circle(SKETCH_21_R)
    extrude(amount=-CUT_EXTRUDE_5_DEPTH, mode=Mode.SUBTRACT)


solid = part.part
